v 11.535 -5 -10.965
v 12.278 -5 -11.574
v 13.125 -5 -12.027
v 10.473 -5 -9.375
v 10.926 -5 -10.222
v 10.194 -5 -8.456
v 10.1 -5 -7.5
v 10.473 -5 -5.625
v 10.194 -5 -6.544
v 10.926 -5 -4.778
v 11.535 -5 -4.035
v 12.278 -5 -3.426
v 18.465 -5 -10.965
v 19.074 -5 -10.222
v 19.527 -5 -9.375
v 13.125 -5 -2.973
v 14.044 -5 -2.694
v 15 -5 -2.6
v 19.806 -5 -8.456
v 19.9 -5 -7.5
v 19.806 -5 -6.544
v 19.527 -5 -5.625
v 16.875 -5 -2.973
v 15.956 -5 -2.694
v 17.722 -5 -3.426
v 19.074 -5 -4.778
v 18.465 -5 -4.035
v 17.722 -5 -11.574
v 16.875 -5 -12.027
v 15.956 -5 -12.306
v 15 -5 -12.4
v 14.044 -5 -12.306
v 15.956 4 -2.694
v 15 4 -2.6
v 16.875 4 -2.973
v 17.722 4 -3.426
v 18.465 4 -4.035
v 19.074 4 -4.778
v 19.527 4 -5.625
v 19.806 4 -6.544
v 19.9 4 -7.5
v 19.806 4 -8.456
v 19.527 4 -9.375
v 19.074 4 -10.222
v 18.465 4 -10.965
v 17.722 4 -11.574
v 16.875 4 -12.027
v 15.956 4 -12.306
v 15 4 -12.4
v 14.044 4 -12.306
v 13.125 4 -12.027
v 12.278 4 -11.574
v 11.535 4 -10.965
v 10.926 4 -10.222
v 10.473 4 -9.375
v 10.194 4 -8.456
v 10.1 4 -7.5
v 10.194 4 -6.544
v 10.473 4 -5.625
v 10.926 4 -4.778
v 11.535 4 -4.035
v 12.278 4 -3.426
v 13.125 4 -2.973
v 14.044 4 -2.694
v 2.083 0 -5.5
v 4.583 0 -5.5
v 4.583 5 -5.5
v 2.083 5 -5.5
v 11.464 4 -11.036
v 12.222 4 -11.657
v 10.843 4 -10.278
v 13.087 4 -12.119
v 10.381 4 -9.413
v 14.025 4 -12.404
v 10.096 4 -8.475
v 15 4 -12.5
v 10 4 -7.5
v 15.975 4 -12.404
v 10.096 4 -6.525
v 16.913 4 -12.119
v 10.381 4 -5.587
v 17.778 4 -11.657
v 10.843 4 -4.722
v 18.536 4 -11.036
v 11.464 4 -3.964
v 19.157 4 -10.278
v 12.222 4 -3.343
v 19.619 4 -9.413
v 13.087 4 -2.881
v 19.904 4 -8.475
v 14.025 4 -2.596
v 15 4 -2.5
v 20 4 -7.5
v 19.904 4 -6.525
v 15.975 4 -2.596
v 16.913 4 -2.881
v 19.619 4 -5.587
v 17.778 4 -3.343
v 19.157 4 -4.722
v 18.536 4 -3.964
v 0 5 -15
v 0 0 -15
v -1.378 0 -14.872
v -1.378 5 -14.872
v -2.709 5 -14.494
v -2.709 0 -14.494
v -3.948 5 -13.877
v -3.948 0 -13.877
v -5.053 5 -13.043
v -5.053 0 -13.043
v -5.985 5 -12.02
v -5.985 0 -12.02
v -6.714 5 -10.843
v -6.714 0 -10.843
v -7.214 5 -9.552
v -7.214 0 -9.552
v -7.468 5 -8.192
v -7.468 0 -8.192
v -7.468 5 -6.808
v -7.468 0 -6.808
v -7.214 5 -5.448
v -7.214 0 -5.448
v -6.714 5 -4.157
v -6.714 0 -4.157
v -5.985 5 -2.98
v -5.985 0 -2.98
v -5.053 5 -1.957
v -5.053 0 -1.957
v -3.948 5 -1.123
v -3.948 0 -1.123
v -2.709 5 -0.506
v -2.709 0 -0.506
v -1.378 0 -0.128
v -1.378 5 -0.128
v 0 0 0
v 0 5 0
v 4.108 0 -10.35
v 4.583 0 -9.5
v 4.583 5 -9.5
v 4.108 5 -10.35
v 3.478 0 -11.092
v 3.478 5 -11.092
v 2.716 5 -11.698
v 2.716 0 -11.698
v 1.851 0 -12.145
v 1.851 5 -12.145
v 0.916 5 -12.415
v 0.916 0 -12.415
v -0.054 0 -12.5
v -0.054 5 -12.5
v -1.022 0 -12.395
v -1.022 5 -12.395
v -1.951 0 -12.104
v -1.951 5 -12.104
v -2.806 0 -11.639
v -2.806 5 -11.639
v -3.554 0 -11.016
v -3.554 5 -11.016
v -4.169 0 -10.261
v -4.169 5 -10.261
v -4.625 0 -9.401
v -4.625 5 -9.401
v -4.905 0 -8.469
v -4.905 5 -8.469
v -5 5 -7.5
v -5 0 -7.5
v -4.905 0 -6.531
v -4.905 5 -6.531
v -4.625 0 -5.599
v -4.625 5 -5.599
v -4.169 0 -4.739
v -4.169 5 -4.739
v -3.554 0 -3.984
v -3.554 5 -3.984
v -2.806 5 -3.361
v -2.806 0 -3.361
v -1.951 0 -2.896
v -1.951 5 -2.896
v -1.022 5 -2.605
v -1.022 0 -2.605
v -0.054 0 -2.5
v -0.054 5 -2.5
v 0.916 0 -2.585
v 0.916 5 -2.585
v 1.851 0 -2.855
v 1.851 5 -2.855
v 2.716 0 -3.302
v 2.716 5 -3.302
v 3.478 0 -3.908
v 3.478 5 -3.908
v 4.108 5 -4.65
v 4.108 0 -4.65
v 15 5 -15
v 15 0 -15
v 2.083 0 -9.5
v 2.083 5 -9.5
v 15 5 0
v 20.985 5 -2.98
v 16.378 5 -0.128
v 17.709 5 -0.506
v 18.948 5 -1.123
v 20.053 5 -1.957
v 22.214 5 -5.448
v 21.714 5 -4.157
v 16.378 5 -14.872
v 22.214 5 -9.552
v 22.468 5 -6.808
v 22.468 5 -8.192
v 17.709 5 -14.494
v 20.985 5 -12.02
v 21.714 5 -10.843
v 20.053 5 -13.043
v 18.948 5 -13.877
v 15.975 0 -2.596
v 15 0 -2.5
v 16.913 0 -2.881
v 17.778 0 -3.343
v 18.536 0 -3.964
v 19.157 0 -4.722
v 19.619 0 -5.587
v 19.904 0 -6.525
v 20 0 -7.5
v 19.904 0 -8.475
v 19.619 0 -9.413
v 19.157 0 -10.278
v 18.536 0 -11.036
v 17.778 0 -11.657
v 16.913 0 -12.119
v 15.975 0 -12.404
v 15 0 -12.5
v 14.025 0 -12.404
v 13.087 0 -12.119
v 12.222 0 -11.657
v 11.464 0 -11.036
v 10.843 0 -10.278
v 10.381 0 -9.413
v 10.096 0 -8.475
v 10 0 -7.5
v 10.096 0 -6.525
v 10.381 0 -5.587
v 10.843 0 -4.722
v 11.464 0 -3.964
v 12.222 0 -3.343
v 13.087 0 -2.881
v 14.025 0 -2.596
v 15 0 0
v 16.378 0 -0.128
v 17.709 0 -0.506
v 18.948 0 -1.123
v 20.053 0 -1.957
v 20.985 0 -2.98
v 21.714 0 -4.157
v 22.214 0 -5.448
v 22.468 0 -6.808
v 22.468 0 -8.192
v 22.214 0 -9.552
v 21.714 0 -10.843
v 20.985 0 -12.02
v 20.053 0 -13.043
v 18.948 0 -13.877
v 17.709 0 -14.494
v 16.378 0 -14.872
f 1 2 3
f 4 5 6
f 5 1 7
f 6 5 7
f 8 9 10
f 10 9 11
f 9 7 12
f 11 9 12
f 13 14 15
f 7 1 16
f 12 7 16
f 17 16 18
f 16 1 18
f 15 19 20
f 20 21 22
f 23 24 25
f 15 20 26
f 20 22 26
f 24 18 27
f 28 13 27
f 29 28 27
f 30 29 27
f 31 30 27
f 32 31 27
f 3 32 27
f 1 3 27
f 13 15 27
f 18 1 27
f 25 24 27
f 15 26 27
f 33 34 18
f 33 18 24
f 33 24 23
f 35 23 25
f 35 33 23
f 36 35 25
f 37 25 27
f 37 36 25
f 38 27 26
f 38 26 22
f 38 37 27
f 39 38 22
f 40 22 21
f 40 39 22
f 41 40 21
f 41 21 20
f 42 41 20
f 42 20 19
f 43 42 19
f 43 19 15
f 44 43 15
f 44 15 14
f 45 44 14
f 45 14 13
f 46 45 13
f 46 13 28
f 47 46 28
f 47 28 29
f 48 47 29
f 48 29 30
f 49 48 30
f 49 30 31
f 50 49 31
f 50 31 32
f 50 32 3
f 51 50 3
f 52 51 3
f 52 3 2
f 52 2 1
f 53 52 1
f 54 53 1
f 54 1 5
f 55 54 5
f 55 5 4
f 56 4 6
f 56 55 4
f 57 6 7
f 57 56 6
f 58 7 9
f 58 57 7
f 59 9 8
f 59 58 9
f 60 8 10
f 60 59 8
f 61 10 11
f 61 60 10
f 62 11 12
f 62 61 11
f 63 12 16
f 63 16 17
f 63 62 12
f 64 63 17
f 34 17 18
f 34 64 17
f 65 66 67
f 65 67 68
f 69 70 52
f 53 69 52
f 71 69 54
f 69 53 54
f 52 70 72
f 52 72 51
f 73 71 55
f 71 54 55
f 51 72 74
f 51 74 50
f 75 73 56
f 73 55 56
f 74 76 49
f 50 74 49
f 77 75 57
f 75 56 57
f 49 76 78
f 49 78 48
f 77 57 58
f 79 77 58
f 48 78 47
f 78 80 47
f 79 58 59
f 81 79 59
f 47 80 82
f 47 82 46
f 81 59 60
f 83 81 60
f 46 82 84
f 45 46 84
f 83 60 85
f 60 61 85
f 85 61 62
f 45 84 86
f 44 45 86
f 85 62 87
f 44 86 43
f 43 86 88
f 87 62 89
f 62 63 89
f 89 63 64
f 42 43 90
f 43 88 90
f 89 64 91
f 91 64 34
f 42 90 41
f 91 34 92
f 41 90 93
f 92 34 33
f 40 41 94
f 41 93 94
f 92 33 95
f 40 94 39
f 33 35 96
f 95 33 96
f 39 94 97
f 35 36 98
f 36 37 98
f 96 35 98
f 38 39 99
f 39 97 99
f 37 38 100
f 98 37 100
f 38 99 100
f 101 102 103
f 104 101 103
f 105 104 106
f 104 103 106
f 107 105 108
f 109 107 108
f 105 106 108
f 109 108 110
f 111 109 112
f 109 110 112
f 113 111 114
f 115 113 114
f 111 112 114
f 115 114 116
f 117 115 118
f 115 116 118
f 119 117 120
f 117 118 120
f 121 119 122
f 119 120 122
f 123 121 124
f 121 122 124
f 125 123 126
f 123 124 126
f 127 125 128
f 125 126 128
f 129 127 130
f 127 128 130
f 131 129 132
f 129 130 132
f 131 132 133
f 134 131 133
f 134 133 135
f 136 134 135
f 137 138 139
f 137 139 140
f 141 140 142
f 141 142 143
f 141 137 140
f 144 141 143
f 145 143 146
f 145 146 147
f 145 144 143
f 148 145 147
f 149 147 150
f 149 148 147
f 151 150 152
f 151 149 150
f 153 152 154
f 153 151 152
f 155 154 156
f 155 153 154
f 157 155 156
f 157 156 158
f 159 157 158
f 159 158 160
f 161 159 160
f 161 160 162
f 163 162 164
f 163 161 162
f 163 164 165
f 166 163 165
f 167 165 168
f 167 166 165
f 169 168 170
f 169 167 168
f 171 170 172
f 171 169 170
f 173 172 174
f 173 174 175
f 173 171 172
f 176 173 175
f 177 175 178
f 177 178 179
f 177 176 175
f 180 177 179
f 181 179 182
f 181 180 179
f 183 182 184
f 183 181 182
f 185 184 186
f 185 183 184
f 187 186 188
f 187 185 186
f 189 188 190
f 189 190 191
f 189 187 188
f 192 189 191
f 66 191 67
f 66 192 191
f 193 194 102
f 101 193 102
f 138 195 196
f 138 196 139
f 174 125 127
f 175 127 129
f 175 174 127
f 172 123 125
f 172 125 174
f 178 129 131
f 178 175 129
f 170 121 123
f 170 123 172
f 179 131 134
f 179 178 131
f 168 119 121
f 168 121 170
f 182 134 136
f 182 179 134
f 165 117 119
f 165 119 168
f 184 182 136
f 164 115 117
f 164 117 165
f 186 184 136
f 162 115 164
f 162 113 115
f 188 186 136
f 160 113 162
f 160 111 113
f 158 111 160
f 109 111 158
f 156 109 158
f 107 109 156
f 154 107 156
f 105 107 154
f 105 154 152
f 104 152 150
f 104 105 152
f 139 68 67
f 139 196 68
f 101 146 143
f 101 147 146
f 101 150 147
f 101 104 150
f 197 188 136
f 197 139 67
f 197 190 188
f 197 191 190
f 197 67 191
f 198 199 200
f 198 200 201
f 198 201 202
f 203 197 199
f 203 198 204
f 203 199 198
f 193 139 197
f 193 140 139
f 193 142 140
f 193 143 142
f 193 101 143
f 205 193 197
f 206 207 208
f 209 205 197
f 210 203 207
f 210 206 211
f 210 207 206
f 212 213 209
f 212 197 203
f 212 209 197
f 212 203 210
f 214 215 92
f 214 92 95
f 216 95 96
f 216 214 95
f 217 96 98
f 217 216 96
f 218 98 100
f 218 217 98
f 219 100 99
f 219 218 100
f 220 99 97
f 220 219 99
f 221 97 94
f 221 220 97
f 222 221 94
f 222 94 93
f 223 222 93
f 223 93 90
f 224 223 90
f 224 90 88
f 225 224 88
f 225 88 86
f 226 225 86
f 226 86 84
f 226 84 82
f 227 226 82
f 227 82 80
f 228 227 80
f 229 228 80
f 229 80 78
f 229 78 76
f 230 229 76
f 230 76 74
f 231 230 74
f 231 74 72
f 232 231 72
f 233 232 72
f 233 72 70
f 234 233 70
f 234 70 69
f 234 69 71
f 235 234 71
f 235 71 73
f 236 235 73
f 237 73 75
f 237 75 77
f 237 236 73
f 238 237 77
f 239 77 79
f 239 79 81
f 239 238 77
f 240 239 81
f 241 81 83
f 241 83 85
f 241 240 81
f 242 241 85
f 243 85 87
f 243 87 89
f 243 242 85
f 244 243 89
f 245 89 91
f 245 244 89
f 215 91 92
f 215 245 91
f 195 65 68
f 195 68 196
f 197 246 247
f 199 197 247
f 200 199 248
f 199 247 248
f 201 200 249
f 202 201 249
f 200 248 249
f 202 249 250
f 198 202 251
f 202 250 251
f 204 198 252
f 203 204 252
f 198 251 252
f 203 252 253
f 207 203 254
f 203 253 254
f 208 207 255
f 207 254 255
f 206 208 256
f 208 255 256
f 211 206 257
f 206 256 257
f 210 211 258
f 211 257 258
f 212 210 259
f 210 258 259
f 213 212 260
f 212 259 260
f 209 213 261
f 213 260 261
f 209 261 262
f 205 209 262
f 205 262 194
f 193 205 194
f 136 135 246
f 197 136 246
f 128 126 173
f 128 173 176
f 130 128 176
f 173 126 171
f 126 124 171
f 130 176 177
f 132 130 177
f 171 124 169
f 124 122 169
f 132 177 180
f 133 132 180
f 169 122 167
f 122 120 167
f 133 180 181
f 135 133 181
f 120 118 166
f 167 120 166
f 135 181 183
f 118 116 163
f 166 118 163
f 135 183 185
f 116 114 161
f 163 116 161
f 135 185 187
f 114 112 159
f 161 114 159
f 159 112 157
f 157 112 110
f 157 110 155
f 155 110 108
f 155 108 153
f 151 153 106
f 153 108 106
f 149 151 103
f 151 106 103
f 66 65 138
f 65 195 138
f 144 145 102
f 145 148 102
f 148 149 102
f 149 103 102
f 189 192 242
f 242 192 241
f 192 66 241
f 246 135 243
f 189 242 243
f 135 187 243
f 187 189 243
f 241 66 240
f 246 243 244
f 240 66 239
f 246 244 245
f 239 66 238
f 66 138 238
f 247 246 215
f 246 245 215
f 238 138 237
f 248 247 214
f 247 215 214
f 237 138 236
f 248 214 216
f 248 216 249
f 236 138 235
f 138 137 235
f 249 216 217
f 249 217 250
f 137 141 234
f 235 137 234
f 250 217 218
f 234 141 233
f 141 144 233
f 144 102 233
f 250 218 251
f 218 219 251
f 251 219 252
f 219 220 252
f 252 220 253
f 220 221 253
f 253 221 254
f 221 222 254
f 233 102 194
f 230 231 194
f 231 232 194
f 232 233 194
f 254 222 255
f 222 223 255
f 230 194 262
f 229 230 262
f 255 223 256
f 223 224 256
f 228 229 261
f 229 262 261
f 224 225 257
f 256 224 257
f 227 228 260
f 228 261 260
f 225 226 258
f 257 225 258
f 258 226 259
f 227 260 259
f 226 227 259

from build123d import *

# Parameters (mm, degrees)
SKETCH1_R           = 5
BOSS_EXTRUDE1_DEPTH = 5
SKETCH2_R           = 4.9
BOSS_EXTRUDE2_DEPTH = 10
BOSS_EXTRUDE3_START = -1
SKETCH4_R           = 5
BOSS_EXTRUDE3_DEPTH = 1


with BuildPart() as part:
    # Sketch1 → Boss-Extrude1 (new body)
    with BuildSketch(Plane(origin=(0, 0, 0), x_dir=(1, 0, 0), z_dir=(0, 1, 0))):
        with BuildLine():
            Line((0, 0), (15, 0))
            ThreePointArc((15, 0), (22.5, 7.5), (15, 15))
            Line((15, 15), (0, 15))
            ThreePointArc((0, 15), (-7.5, 7.5), (0, 0))
        make_face()
        with Locations(Location((15, 7.5, 0), (0, 0, 270))):
            Circle(SKETCH1_R, mode=Mode.SUBTRACT)
        with BuildLine():
            Line((4.582575695, 5.5), (2.082575695, 5.5))
            Line((2.082575695, 5.5), (2.082575695, 9.5))
            Line((2.082575695, 9.5), (4.582575695, 9.5))
            ThreePointArc((4.582575695, 9.5), (-5, 7.5), (4.582575695, 5.5))
        make_face(mode=Mode.SUBTRACT)
    extrude(amount=BOSS_EXTRUDE1_DEPTH)



with BuildPart() as body_2:
    # Sketch2 → Boss-Extrude2 (new body)
    with BuildSketch(Plane(origin=(0, 5, 0), x_dir=(1, 0, 0), z_dir=(0, 1, 0))):
        with Locations(Location((15, 7.5, 0), (0, 0, 270))):
            Circle(SKETCH2_R)
    extrude(amount=-BOSS_EXTRUDE2_DEPTH)


with BuildPart() as part_1:
    add(part.part)

    add(body_2.part)  # Boss-Extrude3 merges body 2
    # Sketch4 → Boss-Extrude3 (add)
    with BuildSketch(Plane(origin=(0, 5, 0), x_dir=(-1, 0, 0), z_dir=(0, 1, 0)).offset(BOSS_EXTRUDE3_START)):
        with Locations(Location((-15, -7.5, 0), (0, 0, 90))):
            Circle(SKETCH4_R)
    extrude(amount=BOSS_EXTRUDE3_DEPTH)


solid = part_1.part
